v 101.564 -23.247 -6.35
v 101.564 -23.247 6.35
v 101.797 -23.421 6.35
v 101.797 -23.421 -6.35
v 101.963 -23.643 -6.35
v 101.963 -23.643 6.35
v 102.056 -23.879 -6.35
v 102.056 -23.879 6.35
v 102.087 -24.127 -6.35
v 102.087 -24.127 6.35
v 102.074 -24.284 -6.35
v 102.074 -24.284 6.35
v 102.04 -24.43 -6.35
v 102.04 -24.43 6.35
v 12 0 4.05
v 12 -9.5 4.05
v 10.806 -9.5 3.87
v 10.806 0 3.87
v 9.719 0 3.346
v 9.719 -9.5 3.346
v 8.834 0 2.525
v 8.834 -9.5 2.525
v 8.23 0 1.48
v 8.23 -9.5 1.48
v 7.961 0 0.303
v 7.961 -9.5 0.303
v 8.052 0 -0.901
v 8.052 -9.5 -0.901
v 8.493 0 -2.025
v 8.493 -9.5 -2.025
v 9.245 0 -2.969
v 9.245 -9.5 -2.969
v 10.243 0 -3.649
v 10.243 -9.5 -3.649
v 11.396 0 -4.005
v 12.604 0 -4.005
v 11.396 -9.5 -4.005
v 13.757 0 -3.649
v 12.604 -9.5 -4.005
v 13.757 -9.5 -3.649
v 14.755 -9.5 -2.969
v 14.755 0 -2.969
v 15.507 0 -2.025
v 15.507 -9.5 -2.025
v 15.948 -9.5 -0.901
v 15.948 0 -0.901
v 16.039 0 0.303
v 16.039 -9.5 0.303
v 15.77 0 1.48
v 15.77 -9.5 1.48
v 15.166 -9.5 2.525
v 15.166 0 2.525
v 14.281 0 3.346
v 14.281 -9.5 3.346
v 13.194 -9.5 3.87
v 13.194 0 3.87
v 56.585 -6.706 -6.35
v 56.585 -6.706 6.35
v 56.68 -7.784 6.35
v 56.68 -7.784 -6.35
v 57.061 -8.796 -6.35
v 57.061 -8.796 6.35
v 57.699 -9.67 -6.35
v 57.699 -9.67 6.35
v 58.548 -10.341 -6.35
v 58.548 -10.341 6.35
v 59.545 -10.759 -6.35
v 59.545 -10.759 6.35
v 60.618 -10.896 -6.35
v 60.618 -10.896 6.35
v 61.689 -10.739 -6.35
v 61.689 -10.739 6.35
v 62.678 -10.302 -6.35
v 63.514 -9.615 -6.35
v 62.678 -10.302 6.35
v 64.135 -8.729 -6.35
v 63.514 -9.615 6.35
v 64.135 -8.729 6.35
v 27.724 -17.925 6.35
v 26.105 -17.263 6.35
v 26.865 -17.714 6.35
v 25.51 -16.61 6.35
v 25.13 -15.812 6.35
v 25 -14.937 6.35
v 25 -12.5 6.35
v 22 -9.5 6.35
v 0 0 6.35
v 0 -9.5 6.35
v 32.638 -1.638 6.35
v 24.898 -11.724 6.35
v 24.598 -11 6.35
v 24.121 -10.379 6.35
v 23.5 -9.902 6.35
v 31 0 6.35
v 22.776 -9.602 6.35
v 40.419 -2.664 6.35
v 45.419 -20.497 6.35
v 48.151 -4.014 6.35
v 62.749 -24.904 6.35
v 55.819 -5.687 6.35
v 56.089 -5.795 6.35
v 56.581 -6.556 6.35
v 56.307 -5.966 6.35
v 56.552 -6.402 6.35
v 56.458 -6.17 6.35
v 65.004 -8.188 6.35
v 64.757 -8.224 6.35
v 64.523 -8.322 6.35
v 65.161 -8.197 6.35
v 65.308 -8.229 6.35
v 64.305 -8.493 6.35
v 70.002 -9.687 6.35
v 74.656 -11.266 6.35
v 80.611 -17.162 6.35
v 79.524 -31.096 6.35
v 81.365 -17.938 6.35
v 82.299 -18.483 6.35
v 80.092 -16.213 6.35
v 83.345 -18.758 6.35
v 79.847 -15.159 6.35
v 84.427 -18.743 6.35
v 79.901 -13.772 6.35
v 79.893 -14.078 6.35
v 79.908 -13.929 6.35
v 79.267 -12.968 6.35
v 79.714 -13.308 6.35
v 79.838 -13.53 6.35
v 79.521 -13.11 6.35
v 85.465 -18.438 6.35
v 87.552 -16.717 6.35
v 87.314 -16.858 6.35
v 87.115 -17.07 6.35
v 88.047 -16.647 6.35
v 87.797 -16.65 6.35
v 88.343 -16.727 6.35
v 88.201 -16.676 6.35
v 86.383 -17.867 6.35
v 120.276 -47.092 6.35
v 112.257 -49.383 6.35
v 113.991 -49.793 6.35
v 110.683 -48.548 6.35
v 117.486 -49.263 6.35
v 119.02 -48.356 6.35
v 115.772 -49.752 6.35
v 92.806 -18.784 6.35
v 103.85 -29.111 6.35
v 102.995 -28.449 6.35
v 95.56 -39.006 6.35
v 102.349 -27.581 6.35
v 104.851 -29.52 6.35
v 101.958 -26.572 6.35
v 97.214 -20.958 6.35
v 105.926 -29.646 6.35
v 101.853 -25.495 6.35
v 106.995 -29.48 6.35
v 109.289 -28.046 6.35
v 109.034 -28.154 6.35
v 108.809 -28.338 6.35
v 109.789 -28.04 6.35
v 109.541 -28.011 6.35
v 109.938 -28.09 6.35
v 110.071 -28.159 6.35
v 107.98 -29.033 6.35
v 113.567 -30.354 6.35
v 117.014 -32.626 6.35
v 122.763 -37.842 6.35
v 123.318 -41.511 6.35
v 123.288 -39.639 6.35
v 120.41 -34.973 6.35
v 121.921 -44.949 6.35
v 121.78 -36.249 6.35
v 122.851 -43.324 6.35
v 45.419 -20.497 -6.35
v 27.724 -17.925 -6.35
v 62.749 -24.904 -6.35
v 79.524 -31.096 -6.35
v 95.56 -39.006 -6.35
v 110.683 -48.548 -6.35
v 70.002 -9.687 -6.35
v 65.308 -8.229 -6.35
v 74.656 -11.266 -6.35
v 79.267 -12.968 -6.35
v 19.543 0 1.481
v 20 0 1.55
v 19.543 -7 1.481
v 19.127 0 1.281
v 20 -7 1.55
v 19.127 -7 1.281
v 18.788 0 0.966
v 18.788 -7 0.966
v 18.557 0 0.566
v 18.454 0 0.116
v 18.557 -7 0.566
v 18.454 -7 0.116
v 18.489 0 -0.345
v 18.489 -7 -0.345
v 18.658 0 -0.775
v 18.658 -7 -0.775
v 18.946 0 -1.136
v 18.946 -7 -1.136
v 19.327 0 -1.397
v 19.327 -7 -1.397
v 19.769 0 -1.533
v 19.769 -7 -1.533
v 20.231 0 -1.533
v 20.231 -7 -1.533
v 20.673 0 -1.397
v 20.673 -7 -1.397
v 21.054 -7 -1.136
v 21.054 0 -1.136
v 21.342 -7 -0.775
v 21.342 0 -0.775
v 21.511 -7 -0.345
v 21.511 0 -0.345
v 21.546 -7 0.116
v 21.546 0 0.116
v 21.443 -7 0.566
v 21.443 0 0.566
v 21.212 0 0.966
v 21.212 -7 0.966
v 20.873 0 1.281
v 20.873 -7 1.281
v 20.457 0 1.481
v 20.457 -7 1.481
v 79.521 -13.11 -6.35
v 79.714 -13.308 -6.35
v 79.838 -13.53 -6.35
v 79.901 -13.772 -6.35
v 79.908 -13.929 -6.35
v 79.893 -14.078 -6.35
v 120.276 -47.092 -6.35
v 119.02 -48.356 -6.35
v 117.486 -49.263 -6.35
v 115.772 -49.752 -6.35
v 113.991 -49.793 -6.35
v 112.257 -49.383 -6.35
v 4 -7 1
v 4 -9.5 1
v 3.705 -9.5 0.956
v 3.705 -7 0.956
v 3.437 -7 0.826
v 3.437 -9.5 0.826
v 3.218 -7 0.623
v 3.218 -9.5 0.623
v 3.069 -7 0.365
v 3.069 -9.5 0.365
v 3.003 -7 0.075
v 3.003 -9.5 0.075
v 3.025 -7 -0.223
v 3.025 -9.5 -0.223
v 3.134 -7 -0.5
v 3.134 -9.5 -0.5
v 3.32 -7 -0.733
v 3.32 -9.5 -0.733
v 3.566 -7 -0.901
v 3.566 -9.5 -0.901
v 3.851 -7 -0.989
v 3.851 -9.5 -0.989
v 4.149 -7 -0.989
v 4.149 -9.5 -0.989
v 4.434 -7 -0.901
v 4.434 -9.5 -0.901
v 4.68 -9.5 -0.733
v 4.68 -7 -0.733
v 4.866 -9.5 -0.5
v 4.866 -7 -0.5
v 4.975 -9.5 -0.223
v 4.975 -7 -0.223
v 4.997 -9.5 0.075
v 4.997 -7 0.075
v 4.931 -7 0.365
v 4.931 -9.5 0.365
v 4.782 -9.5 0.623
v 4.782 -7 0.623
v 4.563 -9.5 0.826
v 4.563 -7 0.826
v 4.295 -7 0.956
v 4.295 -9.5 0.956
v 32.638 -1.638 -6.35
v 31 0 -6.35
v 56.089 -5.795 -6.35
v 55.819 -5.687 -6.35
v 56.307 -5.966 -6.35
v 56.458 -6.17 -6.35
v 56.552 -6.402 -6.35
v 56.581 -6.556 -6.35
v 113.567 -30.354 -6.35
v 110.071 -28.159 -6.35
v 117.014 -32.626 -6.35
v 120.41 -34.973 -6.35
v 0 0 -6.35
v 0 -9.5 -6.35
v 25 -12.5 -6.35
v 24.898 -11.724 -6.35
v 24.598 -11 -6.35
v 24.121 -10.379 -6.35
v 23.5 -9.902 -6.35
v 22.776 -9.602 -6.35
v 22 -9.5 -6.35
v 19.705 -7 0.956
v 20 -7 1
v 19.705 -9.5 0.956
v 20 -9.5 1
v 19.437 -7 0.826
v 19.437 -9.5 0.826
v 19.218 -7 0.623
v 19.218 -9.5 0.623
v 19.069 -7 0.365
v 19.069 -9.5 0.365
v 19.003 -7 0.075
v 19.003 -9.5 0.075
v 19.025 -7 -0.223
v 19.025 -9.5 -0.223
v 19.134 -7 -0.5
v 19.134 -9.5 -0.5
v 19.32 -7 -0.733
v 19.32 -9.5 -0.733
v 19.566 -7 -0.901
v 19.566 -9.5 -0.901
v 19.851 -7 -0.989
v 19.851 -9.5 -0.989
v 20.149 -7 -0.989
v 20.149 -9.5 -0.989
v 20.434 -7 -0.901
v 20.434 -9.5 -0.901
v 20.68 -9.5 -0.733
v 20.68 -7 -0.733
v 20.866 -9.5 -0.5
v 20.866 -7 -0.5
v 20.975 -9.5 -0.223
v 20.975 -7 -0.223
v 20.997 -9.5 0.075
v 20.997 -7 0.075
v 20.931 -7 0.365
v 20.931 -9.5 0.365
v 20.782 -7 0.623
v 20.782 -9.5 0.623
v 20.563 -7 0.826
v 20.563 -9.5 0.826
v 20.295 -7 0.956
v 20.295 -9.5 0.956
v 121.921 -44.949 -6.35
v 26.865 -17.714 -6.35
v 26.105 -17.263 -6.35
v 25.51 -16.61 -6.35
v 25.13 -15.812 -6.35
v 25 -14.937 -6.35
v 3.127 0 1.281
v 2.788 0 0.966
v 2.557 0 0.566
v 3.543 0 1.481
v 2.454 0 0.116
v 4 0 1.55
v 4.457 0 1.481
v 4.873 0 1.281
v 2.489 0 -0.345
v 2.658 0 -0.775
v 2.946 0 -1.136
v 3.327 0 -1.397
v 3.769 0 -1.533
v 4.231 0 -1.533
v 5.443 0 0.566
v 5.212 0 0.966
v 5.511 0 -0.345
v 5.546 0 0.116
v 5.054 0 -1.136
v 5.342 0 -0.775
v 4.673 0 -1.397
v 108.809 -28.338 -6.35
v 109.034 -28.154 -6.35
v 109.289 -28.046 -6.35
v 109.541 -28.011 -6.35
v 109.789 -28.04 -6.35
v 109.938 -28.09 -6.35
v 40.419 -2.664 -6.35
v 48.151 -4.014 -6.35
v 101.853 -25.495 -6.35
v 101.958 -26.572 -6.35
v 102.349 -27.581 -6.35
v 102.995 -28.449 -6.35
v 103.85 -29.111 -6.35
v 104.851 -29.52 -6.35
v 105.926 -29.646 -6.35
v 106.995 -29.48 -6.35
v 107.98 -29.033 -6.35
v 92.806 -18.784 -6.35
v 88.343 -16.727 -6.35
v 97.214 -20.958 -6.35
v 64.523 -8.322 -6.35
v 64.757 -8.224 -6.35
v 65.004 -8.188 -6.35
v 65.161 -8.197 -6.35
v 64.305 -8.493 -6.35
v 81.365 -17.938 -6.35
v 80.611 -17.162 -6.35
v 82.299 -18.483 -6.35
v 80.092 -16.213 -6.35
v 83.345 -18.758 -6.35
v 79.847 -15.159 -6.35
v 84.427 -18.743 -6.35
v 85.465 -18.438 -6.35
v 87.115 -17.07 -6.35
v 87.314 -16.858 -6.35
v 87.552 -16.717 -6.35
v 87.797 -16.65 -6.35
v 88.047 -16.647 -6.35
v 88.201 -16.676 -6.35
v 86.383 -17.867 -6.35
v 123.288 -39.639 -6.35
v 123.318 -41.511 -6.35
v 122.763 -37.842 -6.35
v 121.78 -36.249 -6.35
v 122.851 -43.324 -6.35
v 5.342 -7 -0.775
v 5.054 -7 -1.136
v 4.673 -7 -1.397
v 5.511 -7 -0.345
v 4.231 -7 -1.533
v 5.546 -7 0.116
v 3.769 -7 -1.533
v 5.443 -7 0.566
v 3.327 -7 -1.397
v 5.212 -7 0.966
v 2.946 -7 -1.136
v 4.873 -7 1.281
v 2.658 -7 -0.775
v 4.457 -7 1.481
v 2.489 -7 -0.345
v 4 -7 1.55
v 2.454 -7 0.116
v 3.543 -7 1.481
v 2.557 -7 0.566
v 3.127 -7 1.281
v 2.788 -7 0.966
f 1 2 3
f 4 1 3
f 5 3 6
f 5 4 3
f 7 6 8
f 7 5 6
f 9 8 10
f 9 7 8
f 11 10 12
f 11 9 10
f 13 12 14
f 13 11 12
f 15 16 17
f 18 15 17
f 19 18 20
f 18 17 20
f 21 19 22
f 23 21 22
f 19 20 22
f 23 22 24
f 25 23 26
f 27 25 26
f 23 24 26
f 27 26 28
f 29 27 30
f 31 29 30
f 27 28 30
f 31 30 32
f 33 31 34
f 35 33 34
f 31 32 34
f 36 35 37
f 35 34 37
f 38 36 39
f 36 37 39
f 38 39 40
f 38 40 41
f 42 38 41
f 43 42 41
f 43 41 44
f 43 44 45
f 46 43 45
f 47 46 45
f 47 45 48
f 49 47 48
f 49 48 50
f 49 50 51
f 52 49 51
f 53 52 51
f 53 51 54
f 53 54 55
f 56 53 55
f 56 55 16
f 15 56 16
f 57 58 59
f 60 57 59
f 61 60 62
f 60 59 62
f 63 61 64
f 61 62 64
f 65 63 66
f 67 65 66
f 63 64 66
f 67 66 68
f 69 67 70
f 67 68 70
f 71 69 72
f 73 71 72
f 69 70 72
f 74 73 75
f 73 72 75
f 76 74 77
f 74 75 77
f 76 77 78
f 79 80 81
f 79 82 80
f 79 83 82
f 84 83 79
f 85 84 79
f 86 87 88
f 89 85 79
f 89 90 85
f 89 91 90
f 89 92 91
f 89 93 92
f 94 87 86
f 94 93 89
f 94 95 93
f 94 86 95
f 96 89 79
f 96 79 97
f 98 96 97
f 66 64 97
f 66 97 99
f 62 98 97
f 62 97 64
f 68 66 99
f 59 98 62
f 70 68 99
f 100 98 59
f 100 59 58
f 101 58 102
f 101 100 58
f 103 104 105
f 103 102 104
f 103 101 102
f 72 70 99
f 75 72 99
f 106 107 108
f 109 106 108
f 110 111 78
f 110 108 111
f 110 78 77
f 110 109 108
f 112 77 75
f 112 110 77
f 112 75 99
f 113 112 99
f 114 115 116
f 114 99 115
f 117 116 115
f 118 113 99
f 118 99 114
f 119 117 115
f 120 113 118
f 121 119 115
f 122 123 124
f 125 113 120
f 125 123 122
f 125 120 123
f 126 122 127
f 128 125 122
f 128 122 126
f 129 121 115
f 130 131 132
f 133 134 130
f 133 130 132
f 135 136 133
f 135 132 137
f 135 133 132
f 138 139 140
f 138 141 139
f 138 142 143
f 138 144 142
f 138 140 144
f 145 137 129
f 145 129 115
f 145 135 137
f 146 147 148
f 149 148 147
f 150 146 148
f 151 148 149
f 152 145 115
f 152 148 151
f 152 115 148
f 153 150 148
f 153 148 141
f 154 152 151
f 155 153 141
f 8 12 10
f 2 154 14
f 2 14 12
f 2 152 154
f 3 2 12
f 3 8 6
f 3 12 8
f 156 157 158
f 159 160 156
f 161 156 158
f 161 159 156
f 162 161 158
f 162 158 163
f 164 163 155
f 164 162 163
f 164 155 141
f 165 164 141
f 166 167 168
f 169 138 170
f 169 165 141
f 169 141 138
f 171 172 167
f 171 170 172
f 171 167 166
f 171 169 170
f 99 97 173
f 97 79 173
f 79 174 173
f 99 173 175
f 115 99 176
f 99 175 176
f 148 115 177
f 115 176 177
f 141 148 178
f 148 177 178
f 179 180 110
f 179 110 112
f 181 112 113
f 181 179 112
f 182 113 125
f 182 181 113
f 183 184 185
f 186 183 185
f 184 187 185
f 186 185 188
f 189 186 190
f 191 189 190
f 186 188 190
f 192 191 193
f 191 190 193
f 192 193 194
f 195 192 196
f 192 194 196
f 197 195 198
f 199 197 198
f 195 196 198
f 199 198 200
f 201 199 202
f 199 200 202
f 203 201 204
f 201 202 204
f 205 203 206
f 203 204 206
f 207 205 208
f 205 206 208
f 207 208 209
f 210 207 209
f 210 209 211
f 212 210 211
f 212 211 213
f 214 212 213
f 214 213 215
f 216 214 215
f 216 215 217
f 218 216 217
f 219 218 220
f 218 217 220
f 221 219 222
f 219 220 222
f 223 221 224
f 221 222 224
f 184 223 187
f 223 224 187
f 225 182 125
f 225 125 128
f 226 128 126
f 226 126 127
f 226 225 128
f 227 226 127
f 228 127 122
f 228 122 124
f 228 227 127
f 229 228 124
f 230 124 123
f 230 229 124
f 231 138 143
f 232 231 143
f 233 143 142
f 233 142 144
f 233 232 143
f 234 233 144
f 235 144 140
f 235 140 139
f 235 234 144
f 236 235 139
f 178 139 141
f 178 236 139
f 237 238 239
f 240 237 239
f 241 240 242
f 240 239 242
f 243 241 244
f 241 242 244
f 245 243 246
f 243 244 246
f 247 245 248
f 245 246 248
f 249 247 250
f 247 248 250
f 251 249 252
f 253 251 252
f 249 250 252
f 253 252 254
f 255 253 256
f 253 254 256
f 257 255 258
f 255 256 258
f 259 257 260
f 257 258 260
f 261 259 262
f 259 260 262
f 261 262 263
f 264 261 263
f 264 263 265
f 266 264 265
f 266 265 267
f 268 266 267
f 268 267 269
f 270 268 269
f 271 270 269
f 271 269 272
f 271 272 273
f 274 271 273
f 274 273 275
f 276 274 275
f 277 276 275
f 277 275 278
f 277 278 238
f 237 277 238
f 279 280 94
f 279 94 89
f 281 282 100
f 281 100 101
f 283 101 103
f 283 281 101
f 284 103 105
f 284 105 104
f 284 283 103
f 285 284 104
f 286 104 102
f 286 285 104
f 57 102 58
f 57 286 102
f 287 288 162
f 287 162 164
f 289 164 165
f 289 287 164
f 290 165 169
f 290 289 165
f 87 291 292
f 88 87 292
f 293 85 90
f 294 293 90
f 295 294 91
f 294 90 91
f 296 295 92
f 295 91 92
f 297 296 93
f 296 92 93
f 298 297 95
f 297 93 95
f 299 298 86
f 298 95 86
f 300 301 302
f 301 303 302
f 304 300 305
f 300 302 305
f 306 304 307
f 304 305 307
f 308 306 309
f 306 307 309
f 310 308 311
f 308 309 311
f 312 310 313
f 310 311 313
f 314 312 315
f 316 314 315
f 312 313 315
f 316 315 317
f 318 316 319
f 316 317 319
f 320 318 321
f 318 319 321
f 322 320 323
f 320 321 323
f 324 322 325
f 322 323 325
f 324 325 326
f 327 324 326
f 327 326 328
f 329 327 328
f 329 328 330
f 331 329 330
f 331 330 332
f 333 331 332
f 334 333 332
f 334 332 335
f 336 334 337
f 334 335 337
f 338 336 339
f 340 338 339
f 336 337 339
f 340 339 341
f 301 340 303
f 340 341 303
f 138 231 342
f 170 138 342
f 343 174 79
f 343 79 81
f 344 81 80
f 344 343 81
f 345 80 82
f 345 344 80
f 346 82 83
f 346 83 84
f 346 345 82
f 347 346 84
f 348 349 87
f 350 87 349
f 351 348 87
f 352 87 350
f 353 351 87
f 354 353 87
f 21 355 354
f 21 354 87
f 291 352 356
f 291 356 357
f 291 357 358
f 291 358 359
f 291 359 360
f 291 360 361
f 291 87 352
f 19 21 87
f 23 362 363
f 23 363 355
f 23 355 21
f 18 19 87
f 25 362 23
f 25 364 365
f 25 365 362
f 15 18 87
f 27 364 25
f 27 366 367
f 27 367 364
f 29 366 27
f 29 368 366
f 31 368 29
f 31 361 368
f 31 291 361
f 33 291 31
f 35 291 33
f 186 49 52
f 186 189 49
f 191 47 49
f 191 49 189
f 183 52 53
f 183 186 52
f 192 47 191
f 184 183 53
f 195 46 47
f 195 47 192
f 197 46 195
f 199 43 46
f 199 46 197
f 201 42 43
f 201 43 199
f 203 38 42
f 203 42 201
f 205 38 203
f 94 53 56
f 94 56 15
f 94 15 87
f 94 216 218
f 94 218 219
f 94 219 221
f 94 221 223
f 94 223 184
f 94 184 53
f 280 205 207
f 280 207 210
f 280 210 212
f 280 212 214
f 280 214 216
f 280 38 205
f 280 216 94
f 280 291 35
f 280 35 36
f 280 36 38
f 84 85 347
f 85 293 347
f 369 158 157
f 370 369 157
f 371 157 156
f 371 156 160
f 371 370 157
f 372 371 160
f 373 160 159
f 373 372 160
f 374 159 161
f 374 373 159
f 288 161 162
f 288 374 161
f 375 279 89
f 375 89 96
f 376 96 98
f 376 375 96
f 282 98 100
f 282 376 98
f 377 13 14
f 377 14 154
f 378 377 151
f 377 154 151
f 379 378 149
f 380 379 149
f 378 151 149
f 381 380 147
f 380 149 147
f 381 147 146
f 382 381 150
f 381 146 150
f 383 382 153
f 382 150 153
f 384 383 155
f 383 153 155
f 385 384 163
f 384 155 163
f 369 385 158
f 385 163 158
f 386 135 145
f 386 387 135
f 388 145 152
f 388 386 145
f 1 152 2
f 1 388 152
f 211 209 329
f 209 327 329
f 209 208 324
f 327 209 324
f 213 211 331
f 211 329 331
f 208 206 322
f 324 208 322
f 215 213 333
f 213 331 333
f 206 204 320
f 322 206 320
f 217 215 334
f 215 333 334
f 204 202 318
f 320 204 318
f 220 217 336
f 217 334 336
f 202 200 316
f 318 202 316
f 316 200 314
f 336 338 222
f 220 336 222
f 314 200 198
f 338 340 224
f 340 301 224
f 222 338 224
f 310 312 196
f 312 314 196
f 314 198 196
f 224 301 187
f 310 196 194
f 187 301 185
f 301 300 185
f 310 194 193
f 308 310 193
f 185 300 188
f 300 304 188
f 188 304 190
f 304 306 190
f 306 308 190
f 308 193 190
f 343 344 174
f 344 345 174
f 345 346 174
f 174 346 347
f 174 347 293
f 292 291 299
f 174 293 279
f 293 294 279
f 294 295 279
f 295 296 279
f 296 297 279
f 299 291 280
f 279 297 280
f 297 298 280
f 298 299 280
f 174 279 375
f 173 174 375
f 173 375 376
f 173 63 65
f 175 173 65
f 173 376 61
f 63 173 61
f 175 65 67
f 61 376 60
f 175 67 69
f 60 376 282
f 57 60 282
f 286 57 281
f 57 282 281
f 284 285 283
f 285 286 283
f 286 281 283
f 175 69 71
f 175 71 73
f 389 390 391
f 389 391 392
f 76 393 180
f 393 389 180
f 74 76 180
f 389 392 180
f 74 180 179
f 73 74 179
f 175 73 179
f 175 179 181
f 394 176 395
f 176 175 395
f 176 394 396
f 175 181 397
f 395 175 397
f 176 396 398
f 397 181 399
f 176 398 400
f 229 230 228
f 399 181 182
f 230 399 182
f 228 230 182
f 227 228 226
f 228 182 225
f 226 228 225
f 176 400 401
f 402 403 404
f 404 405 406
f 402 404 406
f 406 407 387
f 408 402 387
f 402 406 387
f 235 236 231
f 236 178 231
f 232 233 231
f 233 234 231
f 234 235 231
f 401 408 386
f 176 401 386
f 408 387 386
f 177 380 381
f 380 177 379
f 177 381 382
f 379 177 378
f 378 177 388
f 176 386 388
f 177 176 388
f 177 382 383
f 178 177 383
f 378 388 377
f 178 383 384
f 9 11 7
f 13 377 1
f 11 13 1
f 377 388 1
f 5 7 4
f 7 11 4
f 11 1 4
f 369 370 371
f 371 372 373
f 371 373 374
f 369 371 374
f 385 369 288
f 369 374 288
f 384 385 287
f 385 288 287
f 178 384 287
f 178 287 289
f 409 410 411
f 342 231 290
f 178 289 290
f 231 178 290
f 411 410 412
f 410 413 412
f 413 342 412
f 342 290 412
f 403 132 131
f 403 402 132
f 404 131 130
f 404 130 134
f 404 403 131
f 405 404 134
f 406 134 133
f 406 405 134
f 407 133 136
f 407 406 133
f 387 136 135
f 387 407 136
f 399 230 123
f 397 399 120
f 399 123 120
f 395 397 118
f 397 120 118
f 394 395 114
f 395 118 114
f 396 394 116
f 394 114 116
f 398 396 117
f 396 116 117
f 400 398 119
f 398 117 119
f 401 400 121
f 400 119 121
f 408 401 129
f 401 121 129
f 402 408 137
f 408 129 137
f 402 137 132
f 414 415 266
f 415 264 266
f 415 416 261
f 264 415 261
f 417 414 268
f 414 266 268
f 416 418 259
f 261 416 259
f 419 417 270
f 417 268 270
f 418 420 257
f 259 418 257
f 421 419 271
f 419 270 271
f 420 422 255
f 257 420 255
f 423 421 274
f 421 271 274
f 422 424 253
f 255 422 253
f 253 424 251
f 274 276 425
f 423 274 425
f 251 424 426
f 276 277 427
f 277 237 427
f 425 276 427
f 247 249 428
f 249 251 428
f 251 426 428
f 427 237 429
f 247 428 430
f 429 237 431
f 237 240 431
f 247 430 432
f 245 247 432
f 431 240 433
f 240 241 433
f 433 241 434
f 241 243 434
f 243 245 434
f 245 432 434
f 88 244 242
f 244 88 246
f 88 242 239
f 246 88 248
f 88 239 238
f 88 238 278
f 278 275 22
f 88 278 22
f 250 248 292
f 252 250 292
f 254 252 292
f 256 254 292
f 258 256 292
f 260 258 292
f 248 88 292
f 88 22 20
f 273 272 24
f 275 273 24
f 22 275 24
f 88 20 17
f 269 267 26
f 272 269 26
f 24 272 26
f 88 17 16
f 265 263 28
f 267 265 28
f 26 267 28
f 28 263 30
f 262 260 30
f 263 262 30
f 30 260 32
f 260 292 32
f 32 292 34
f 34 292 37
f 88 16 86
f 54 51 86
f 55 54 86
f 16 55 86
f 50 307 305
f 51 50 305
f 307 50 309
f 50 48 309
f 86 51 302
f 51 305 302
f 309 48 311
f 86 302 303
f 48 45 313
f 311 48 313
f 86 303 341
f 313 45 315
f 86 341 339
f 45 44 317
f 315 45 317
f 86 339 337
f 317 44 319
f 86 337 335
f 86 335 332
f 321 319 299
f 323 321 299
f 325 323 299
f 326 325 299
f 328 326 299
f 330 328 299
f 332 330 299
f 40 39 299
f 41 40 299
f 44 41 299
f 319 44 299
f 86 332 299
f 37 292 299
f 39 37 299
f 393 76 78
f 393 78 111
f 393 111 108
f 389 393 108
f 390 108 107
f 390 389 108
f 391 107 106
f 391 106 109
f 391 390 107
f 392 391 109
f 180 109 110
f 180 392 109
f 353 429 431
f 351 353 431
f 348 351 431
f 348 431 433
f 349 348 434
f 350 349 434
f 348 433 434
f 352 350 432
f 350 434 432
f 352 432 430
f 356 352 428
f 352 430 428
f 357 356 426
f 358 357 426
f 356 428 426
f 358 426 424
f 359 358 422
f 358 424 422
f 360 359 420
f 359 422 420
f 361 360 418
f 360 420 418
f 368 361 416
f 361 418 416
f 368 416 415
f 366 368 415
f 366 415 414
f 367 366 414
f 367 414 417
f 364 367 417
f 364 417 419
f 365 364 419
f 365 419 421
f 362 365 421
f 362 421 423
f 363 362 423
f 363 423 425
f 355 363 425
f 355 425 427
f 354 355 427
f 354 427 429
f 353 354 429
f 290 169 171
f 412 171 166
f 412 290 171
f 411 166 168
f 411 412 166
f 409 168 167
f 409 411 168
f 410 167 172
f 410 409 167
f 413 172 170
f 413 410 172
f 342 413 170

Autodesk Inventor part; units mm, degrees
ref_plane "YZ Plane" through (0, 0, 0) normal (1, 0, 0) x (0, 1, 0)
ref_plane "XZ Plane" through (0, 0, 0) normal (0, 1, 0) x (-1, 0, 0)
ref_plane "XY Plane" through (0, 0, 0) normal (0, 0, 1) x (1, 0, 0)
sketch "Body Outline" plane through (0, 0, 0) normal (0, 0, 1) x (1, 0, 0)
  line L0 (0, 0) -> (31, 0)
  line L1 (31, 0) -> (32.6381, -1.6381)
  line L2 (0, 0) -> (0, -9.5)
  line L3 (0, -9.5) -> (25, -9.5)
  line L4 (25, -9.5) -> (25, -17.6949)
  arc A0 (126.2645, -39.2876) -> (32.6381, -1.6381) centre (12, -188.2) ccw
  arc A1 (116.0982, -52.5366) -> (25, -17.6949) centre (12, -188.2) ccw
  line L5 (116.0982, -52.5366) -> (126.2645, -39.2876)
  dimension "d0" = 45
  dimension "d1" = 0
  dimension "d2" = 0
  dimension "d3" = 9.5
  dimension "d4" = 171
  dimension "d5" = 187.7
  dimension "d6" = 37.5
  dimension "d7" = 12
  dimension "d8" = 188.2
  dimension "d9" = 25
  dimension "d10" = 31
extrude "Body" add sketch "Body Outline" along normal mid plane 12.7
sketch "Dowel Pin Hole Positions" plane through (0, 0, 6.35) normal (0, 1, 0) x (1, 0, 0)
  line L0 (0, 12.7) -> (0, 0) projected
  point P0 (0, 6.35)
  point P1 (4, 6.35)
  point P2 (20, 6.35)
  dimension "d13" = 0
  dimension "d14" = 4
  dimension "d15" = 0
  dimension "d16" = 20
hole "Dowel Pin Holes" at (4, 0, 0) at (20, 0, 0) direction (0, -1, 0) diameter 2 end through all counterbore diameter 3.1 counterbore depth 7
sketch "Fastening Hole Position" plane through (0, 0, 6.35) normal (0, 1, 0) x (1, 0, 0)
  line L0 (0, 12.7) -> (0, 0) projected
  point P0 (0, 6.35)
  point P1 (12, 6.35)
  dimension "d24" = 0
  dimension "d25" = 12
hole "Fastening Hole" at (12, 0, 0) direction (0, -1, 0) diameter 8.1 end through all
sketch "Thumbscrew Cutout Outline" plane through (0, 0, 6.35) normal (0, 0, 1) x (1, 0, 0)
  arc A0 (126.2645, -39.2876) -> (32.6381, -1.6381) centre (12, -188.2) ccw projected
  line L0 (54.964, -27.8563) -> (60.5803, -6.8957) construction
  line L1 (0, 0) -> (0, -9.5) projected
  arc A1 (60.5803, -6.8957) -> (28.3591, -1.2143) centre (12, -188.2) ccw construction
  line L2 (12, -188.2) -> (28.3591, -1.2143) construction
  line L3 (12, -188.2) -> (60.5803, -6.8957) construction
  arc A2 (54.964, -27.8563) -> (26.4679, -22.8317) centre (12, -188.2) ccw construction
  line L4 (12, -188.2) -> (26.4679, -22.8317) construction
  line L5 (12, -188.2) -> (54.964, -27.8563) construction
  circle A3 centre (60.5803, -6.8957) radius 4
  dimension "d50" = 15
  dimension "d51" = 10
  dimension "d52" = 10
  dimension "d53" = 166
  dimension "d54" = 187.7
  dimension "d67" = 8
extrude "Thumbscrew Cutout" cut sketch "Thumbscrew Cutout Outline" against normal through all
pattern_circular "Thumbscrew Cutout Pattern" count 3 over 15 about axis through (12, -188.2, 0) along (0, 0, -1) of "Thumbscrew Cutout"
fillet "Body Fillet" radius 1 6 edges at (56.7058, -5.9017, 0) (64.4328, -7.9721, 0) (80.1181, -13.2965, 0) (87.5087, -16.3578, 0) (102.3648, -23.6841, 0) (109.2926, -27.6838, 0)
fillet "Body Fillet" radius 3 2 edges at (25, -9.5, 0) (25, -17.6949, 0)
fillet "Body Fillet" radius 7 2 edges at (126.2645, -39.2876, 0) (116.0982, -52.5366, 0)
equation "\"d54\" = d5"
properties part number "Arm Simplified" material "Aluminum 6061"
